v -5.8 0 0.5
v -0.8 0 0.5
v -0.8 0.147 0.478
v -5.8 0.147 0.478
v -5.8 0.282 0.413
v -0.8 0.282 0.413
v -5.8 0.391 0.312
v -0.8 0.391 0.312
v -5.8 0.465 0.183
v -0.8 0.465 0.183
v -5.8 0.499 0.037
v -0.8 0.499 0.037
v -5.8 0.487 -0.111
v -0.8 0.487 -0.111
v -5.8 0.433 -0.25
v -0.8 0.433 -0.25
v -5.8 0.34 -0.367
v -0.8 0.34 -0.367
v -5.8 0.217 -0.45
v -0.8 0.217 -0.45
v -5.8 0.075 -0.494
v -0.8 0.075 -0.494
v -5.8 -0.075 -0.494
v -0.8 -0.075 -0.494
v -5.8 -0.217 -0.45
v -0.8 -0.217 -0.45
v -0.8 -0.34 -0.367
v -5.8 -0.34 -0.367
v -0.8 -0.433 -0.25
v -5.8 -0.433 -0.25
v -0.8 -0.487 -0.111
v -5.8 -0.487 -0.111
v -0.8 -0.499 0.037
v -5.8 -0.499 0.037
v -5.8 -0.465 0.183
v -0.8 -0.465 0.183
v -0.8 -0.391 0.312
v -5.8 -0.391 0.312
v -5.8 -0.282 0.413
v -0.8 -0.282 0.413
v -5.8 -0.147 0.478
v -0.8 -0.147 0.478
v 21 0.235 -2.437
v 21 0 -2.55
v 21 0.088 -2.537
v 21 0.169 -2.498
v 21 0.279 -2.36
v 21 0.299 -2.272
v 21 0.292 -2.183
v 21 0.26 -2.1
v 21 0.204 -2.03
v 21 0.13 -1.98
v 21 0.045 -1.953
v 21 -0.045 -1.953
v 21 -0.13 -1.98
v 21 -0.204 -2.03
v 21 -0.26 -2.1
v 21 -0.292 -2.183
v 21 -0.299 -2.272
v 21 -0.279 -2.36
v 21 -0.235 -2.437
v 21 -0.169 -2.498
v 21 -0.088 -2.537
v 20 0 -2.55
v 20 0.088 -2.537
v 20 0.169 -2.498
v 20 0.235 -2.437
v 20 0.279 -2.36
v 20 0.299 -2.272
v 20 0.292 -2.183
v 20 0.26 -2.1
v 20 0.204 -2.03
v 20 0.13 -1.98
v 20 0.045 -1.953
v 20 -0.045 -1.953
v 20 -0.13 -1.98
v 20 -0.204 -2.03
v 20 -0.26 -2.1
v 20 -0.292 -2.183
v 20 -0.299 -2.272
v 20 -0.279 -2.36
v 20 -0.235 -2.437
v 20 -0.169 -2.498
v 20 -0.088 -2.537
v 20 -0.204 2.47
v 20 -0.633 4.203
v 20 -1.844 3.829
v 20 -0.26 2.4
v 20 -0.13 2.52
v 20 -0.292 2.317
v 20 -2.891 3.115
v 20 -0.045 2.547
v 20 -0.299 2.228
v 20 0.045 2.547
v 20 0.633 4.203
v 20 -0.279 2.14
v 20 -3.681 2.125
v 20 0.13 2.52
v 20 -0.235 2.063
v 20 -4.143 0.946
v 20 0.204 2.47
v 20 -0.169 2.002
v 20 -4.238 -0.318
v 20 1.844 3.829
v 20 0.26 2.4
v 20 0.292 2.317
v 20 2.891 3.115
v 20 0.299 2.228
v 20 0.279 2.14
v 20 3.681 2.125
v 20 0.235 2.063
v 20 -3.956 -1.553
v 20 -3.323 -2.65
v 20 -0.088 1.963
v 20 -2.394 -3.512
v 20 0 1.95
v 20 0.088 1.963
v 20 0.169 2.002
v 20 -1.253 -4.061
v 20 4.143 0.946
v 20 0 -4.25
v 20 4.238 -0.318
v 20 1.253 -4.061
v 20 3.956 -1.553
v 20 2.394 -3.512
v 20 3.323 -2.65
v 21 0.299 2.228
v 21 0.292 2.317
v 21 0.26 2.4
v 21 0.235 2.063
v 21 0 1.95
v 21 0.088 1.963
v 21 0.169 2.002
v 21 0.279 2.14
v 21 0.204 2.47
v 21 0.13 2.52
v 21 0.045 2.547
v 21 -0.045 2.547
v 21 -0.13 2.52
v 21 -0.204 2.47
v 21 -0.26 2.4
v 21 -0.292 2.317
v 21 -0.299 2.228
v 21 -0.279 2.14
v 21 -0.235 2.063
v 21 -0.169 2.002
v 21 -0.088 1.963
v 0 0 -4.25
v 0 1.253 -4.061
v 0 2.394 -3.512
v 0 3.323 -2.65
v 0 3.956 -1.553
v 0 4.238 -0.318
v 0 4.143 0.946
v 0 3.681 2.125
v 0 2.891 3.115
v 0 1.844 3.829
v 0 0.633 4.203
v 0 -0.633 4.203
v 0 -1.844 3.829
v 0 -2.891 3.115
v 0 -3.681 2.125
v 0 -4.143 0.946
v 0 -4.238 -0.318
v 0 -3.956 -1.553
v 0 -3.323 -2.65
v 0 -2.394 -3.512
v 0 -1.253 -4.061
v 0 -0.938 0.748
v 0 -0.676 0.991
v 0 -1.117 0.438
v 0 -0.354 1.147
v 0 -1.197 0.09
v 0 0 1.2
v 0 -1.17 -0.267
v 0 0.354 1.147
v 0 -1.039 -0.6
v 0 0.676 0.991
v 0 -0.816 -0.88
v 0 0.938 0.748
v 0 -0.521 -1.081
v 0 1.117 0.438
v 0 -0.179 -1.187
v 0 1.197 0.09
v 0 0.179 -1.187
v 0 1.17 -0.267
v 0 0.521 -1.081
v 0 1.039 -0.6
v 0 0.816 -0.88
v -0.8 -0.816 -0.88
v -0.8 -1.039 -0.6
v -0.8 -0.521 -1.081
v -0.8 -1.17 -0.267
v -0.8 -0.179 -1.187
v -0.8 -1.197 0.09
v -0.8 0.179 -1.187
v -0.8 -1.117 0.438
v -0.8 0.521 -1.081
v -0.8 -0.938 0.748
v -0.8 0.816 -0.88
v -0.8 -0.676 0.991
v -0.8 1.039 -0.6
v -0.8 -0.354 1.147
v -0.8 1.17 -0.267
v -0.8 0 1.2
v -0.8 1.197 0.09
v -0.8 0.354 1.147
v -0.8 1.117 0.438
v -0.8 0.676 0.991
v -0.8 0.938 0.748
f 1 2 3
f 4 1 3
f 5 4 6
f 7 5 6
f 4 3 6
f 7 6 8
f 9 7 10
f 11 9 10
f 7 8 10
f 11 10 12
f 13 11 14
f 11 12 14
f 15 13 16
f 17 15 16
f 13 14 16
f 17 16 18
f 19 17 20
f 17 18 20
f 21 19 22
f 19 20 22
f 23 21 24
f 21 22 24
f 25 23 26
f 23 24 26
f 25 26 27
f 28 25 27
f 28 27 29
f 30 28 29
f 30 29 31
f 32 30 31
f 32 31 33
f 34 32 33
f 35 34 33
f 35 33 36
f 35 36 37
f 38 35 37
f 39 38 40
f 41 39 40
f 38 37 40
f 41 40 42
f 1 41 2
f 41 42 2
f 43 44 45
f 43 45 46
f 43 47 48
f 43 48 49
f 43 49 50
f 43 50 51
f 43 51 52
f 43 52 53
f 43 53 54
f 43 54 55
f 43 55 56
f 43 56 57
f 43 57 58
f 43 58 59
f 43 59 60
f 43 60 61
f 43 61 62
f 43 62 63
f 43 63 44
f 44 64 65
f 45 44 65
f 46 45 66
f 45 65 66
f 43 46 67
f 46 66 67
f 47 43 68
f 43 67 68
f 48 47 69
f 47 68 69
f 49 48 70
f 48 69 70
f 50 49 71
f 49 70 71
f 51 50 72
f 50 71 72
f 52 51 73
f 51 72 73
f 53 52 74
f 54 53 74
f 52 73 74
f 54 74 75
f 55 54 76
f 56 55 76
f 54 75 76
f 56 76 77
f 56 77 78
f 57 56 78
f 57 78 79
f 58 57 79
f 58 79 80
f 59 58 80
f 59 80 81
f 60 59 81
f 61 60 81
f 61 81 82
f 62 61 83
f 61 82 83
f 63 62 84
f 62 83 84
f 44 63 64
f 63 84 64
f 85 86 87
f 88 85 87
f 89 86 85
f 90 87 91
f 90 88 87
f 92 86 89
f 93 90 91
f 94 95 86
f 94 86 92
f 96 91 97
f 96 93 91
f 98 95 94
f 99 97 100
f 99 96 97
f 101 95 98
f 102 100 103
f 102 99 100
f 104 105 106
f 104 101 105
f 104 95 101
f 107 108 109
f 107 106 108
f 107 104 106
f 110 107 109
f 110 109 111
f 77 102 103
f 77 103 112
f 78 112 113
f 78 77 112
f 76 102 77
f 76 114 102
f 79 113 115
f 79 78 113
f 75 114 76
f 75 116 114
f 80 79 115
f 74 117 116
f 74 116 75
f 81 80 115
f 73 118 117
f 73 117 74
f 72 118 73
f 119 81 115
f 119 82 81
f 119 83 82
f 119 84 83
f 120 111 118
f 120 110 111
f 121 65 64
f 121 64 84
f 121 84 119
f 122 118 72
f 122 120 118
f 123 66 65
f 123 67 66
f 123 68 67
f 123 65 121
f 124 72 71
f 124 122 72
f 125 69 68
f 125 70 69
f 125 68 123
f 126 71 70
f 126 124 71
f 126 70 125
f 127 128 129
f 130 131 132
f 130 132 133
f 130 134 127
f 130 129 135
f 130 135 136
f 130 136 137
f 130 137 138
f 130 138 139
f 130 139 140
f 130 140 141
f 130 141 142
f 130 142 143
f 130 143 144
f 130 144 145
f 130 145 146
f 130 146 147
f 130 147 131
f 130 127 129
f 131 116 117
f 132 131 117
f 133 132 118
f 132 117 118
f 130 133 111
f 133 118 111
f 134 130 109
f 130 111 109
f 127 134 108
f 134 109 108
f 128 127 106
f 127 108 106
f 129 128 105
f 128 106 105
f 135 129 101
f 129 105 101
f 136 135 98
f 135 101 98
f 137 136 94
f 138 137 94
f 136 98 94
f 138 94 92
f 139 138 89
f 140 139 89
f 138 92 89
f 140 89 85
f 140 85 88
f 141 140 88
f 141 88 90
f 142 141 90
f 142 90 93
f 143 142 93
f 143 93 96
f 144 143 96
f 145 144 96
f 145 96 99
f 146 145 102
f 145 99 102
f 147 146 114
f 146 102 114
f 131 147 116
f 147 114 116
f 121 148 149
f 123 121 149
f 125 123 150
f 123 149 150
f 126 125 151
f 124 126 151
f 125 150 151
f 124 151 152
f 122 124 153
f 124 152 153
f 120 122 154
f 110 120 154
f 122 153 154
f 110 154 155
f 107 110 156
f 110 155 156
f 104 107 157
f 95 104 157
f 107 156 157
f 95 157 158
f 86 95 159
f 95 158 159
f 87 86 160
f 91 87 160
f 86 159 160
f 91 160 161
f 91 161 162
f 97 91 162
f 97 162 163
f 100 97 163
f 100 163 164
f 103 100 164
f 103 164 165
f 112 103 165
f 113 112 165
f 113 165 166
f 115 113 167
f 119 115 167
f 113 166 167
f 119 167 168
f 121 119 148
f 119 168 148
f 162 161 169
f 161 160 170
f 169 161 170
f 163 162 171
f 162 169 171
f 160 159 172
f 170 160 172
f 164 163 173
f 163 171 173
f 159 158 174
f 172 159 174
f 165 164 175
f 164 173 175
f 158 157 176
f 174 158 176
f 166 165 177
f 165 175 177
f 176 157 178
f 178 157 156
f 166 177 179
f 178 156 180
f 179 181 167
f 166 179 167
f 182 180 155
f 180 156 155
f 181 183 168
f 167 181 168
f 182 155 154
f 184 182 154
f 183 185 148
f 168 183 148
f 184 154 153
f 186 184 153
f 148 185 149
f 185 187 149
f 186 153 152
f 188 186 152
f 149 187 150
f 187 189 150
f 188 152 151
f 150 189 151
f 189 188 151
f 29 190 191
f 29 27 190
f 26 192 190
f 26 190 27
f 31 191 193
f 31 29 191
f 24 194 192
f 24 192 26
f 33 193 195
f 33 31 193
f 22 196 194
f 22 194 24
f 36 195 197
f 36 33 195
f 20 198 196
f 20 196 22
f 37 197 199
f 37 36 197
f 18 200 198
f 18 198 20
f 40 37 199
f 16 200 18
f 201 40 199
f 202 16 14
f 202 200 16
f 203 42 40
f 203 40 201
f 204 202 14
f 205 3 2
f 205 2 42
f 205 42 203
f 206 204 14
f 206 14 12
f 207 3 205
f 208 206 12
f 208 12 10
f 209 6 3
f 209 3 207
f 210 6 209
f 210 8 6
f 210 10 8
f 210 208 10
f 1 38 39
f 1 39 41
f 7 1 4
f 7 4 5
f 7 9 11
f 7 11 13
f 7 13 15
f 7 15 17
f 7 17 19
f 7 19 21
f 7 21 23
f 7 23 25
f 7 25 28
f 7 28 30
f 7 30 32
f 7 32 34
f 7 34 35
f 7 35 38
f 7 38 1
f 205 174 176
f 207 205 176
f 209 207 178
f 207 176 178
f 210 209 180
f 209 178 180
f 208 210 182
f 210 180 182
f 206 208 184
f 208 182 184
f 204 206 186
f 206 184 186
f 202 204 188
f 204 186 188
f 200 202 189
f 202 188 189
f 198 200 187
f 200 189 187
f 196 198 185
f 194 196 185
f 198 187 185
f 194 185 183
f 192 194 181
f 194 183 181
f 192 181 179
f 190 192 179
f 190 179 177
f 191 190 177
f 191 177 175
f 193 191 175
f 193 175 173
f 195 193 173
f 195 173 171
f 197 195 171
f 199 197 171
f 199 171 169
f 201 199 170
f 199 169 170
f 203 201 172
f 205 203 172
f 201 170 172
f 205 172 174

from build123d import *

# Parameters (mm, degrees)
SKETCH1_R           = 4.25
BOSS_EXTRUDE1_DEPTH = 20
SKETCH2_R           = 1.2
BOSS_EXTRUDE2_DEPTH = 0.8
SKETCH3_R           = 0.5
BOSS_EXTRUDE3_DEPTH = 5
SKETCH4_R           = 0.3
BOSS_EXTRUDE4_DEPTH = 1


with BuildPart() as part:
    # Sketch1 → Boss-Extrude1 (new body)
    with BuildSketch(Plane(origin=(0, 0, 0), x_dir=(0, 0, -1), z_dir=(1, 0, 0))):
        Circle(SKETCH1_R)
    extrude(amount=BOSS_EXTRUDE1_DEPTH)

    # Sketch2 → Boss-Extrude2 (add)
    with BuildSketch(Plane.ZY):
        Circle(SKETCH2_R)
    extrude(amount=BOSS_EXTRUDE2_DEPTH)

    # Sketch3 → Boss-Extrude3 (add)
    with BuildSketch(Plane.ZY.offset(0.8)):
        Circle(SKETCH3_R)
    extrude(amount=BOSS_EXTRUDE3_DEPTH)

    # Sketch4 → Boss-Extrude4 (add)
    with BuildSketch(Plane(origin=(20, 0, 0), x_dir=(0, 0, -1), z_dir=(1, 0, 0))):
        with Locations((-2.25, 0)):
            Circle(SKETCH4_R)
        with Locations((2.25, 0)):
            Circle(SKETCH4_R)
    extrude(amount=BOSS_EXTRUDE4_DEPTH)


solid = part.part
